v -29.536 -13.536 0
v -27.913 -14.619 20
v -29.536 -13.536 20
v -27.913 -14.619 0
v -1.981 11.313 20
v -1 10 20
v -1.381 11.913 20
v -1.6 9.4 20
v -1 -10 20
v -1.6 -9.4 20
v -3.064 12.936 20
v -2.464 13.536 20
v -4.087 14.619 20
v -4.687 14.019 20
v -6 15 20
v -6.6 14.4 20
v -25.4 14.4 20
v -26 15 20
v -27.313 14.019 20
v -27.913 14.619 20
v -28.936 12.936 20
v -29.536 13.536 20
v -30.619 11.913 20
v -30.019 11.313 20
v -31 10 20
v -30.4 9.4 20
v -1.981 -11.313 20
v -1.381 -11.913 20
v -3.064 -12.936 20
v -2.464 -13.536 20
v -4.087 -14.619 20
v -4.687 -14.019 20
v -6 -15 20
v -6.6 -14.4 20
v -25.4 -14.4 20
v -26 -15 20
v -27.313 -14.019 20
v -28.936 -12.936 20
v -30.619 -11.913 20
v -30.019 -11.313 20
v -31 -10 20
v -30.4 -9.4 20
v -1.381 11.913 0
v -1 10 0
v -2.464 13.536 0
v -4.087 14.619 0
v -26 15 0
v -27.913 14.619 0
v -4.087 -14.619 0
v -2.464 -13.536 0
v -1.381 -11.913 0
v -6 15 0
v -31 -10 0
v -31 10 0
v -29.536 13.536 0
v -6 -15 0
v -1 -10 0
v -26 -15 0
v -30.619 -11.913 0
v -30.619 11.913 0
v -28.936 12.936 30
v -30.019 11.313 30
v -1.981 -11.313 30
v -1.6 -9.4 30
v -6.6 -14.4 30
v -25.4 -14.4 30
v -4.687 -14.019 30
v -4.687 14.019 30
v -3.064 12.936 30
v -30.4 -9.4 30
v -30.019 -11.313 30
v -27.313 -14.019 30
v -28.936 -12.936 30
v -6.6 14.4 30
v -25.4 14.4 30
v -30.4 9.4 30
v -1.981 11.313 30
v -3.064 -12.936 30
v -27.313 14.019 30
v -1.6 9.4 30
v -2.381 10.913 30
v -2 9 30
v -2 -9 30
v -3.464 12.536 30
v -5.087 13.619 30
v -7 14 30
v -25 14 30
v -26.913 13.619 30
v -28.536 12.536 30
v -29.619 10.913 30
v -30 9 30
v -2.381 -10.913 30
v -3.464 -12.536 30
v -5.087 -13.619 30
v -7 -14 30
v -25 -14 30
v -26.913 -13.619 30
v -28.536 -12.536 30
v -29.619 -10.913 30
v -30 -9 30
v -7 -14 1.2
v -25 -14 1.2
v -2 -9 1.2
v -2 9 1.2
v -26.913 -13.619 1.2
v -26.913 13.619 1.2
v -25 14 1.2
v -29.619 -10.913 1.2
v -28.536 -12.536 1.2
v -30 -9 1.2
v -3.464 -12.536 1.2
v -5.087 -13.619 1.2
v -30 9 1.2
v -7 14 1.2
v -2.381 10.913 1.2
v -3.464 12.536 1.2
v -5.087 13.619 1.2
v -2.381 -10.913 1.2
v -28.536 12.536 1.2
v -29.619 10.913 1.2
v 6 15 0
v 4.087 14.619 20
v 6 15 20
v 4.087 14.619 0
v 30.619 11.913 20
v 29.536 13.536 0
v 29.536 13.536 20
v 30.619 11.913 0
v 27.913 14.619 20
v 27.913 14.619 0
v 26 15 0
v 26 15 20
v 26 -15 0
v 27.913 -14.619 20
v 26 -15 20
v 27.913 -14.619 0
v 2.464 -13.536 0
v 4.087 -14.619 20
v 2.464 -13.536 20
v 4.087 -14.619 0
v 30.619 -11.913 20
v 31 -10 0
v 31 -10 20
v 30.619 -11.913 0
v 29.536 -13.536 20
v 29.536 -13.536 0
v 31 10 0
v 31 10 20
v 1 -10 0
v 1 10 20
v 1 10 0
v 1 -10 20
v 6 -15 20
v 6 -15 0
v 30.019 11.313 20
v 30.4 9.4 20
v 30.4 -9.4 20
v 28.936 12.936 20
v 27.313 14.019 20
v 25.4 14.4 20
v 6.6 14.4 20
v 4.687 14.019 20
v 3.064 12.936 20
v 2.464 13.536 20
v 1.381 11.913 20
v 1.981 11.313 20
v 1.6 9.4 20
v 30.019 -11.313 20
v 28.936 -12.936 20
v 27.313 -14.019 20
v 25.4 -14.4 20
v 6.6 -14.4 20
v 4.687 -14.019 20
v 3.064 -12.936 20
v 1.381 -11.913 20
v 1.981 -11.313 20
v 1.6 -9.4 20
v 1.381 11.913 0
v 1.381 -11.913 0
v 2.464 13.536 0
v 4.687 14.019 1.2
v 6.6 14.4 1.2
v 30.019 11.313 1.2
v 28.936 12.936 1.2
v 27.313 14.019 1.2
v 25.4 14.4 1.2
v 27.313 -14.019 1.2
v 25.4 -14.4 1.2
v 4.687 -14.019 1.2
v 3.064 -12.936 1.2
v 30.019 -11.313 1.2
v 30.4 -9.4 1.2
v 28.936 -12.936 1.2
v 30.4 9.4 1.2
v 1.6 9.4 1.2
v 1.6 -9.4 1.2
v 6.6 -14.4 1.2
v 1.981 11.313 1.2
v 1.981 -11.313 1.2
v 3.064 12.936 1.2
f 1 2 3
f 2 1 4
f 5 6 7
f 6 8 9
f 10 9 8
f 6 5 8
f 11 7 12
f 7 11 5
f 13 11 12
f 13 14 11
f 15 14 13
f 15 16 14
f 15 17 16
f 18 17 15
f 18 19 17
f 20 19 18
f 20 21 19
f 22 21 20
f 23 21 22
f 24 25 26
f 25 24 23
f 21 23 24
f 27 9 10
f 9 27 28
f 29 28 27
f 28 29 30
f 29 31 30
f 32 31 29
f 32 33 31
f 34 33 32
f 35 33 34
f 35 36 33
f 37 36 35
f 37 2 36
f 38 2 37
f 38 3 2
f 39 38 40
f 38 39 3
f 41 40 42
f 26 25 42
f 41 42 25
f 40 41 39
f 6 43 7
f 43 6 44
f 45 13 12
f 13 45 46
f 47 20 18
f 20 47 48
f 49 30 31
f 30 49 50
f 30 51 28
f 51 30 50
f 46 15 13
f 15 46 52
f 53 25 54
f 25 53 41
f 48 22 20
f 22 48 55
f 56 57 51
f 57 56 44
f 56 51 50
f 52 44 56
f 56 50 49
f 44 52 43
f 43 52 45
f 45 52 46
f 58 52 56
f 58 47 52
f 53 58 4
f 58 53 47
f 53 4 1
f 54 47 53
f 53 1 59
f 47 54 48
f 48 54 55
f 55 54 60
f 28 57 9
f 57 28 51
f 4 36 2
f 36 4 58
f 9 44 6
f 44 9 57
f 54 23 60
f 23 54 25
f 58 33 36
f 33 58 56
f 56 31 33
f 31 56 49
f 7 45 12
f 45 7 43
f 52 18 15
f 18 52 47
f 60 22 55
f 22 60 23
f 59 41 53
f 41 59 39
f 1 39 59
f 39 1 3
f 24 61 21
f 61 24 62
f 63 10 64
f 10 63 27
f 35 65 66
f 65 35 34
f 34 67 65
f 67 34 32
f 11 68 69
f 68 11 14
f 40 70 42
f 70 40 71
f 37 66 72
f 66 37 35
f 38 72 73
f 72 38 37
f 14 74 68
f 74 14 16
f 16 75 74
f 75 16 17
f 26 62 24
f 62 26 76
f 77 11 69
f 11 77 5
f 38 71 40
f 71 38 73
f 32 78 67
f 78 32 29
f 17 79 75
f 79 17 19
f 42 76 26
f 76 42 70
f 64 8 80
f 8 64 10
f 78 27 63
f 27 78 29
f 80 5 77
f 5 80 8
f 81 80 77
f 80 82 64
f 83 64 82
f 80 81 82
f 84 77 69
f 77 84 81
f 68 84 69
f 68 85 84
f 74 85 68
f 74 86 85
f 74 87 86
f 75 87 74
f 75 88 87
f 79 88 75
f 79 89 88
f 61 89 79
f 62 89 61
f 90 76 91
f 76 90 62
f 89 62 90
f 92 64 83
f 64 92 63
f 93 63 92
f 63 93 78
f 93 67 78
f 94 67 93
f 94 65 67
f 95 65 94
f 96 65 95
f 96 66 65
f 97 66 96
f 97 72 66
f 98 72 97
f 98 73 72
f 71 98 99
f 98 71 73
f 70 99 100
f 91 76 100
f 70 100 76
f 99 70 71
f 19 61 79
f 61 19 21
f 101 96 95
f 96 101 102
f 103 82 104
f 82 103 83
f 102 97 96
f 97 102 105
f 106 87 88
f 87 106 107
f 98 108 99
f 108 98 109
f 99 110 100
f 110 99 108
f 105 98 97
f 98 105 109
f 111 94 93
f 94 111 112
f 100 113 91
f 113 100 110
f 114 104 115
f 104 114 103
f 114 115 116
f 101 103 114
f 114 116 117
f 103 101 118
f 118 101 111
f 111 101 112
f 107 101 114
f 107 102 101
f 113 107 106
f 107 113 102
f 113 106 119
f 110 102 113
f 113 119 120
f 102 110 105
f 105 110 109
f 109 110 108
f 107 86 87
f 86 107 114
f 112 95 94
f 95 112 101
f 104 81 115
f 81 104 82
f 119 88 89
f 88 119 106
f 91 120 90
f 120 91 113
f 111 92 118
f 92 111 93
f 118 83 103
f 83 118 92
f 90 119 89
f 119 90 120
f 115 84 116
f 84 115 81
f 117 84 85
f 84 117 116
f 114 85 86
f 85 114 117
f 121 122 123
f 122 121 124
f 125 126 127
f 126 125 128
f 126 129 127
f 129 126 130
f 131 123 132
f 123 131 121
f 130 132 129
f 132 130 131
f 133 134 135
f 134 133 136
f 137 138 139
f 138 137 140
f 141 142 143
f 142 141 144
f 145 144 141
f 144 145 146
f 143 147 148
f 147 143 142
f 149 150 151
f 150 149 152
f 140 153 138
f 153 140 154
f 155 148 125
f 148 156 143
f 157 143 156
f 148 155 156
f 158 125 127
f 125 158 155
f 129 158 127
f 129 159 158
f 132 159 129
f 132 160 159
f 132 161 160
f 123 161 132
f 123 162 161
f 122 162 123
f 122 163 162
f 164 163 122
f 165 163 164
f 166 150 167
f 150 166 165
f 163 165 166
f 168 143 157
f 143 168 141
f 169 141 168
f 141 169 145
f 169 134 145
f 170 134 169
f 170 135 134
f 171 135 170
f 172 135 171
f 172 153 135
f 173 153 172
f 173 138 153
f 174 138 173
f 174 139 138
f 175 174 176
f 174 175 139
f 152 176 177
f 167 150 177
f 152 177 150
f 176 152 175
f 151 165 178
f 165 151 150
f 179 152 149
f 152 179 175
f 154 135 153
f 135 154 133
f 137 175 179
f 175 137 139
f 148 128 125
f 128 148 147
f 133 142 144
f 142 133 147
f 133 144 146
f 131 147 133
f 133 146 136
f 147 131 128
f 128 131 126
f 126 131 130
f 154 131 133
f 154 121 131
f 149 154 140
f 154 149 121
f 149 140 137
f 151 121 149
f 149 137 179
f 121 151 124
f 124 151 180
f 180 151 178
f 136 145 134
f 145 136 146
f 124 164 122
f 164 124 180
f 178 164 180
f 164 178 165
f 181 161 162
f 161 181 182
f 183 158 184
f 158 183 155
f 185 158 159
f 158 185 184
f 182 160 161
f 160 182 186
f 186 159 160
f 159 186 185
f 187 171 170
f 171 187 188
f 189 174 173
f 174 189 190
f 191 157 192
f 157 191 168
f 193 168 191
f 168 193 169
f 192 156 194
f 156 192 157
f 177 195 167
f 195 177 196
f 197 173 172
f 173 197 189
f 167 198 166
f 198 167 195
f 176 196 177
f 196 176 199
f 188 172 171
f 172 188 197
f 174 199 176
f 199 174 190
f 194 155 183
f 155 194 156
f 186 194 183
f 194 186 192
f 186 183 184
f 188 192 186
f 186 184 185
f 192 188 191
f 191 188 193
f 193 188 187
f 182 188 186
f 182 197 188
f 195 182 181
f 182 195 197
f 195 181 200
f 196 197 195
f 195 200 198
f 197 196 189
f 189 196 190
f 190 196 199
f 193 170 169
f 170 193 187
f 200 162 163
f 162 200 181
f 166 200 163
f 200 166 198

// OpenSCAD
// http://www.thingiverse.com/thing:213934

// ================ variables

//CUSTOMIZER VARIABLES

/* [Main] */

// in mm
x_width=30;

// in mm
y_width=30;

// in mm
height=10;
// height in mm
lip_height=5;

top_height = 10;

snugfit=0.0;
// Wall thickness in mm
thickness=1.2; // [1:10]
lip_thickness=0.8;

// Corner roundover in mm (0=sharp corner)
radius=5; // [0:50]

// Generate the box
do_box=1; // [0:no,1:yes]

// Generate a lid
do_lid=1; // [0:no,1:yes]


//CUSTOMIZER VARIABLES END

// Screw pilot hole size
screw_pilot=1.125*1;

// Screw hole size
screw_hole=2.5*1;

// Whether you want the screw countersunk
screw_countersink=0*1;

// =============== calculated variables
//lid_height=min(height/4,lip_height);

corner_radius=min(radius,x_width/2,y_width/2);
xadj=x_width-(corner_radius*2);
yadj=y_width-(corner_radius*2);

// =============== program

// ---- The box
box_height_total = height+lip_height;
if(do_box==1) translate([-((x_width/2+1)*do_lid),0,height/2]) difference() {

union() {
minkowski() // main body
{
 cube([xadj,yadj,height],center=true);
 cylinder(r=corner_radius,h=height);
}

translate([0,0,lip_height/2]) minkowski() // main body overlap
{
 cube([xadj-thickness,yadj-thickness,box_height_total],center=true);
 cylinder(r=corner_radius,h=box_height_total);
}
}

// Difference
translate([0,0,lip_height/2 + thickness]) minkowski() // inside area
{
 cube([xadj-((thickness+lip_thickness+snugfit)),yadj-((thickness+lip_thickness+snugfit)),box_height_total],center=true);
 cylinder(r=corner_radius,h=box_height_total);
}

};

// ---- The lid
lid_height_total = top_height;
if(do_lid==1) translate([(x_width/2+1)*do_box,0,lid_height_total/2]) {

difference() {
minkowski() // main body
{
 cube([xadj,yadj,lid_height_total],center=true);
 cylinder(r=corner_radius,h=lid_height_total);
}


translate([0,0,thickness]) minkowski() // inside area
{
 cube([xadj-(thickness-snugfit),yadj-(thickness-snugfit),lid_height_total],center=true);
 cylinder(r=corner_radius,h=lid_height_total);
}
}

};
